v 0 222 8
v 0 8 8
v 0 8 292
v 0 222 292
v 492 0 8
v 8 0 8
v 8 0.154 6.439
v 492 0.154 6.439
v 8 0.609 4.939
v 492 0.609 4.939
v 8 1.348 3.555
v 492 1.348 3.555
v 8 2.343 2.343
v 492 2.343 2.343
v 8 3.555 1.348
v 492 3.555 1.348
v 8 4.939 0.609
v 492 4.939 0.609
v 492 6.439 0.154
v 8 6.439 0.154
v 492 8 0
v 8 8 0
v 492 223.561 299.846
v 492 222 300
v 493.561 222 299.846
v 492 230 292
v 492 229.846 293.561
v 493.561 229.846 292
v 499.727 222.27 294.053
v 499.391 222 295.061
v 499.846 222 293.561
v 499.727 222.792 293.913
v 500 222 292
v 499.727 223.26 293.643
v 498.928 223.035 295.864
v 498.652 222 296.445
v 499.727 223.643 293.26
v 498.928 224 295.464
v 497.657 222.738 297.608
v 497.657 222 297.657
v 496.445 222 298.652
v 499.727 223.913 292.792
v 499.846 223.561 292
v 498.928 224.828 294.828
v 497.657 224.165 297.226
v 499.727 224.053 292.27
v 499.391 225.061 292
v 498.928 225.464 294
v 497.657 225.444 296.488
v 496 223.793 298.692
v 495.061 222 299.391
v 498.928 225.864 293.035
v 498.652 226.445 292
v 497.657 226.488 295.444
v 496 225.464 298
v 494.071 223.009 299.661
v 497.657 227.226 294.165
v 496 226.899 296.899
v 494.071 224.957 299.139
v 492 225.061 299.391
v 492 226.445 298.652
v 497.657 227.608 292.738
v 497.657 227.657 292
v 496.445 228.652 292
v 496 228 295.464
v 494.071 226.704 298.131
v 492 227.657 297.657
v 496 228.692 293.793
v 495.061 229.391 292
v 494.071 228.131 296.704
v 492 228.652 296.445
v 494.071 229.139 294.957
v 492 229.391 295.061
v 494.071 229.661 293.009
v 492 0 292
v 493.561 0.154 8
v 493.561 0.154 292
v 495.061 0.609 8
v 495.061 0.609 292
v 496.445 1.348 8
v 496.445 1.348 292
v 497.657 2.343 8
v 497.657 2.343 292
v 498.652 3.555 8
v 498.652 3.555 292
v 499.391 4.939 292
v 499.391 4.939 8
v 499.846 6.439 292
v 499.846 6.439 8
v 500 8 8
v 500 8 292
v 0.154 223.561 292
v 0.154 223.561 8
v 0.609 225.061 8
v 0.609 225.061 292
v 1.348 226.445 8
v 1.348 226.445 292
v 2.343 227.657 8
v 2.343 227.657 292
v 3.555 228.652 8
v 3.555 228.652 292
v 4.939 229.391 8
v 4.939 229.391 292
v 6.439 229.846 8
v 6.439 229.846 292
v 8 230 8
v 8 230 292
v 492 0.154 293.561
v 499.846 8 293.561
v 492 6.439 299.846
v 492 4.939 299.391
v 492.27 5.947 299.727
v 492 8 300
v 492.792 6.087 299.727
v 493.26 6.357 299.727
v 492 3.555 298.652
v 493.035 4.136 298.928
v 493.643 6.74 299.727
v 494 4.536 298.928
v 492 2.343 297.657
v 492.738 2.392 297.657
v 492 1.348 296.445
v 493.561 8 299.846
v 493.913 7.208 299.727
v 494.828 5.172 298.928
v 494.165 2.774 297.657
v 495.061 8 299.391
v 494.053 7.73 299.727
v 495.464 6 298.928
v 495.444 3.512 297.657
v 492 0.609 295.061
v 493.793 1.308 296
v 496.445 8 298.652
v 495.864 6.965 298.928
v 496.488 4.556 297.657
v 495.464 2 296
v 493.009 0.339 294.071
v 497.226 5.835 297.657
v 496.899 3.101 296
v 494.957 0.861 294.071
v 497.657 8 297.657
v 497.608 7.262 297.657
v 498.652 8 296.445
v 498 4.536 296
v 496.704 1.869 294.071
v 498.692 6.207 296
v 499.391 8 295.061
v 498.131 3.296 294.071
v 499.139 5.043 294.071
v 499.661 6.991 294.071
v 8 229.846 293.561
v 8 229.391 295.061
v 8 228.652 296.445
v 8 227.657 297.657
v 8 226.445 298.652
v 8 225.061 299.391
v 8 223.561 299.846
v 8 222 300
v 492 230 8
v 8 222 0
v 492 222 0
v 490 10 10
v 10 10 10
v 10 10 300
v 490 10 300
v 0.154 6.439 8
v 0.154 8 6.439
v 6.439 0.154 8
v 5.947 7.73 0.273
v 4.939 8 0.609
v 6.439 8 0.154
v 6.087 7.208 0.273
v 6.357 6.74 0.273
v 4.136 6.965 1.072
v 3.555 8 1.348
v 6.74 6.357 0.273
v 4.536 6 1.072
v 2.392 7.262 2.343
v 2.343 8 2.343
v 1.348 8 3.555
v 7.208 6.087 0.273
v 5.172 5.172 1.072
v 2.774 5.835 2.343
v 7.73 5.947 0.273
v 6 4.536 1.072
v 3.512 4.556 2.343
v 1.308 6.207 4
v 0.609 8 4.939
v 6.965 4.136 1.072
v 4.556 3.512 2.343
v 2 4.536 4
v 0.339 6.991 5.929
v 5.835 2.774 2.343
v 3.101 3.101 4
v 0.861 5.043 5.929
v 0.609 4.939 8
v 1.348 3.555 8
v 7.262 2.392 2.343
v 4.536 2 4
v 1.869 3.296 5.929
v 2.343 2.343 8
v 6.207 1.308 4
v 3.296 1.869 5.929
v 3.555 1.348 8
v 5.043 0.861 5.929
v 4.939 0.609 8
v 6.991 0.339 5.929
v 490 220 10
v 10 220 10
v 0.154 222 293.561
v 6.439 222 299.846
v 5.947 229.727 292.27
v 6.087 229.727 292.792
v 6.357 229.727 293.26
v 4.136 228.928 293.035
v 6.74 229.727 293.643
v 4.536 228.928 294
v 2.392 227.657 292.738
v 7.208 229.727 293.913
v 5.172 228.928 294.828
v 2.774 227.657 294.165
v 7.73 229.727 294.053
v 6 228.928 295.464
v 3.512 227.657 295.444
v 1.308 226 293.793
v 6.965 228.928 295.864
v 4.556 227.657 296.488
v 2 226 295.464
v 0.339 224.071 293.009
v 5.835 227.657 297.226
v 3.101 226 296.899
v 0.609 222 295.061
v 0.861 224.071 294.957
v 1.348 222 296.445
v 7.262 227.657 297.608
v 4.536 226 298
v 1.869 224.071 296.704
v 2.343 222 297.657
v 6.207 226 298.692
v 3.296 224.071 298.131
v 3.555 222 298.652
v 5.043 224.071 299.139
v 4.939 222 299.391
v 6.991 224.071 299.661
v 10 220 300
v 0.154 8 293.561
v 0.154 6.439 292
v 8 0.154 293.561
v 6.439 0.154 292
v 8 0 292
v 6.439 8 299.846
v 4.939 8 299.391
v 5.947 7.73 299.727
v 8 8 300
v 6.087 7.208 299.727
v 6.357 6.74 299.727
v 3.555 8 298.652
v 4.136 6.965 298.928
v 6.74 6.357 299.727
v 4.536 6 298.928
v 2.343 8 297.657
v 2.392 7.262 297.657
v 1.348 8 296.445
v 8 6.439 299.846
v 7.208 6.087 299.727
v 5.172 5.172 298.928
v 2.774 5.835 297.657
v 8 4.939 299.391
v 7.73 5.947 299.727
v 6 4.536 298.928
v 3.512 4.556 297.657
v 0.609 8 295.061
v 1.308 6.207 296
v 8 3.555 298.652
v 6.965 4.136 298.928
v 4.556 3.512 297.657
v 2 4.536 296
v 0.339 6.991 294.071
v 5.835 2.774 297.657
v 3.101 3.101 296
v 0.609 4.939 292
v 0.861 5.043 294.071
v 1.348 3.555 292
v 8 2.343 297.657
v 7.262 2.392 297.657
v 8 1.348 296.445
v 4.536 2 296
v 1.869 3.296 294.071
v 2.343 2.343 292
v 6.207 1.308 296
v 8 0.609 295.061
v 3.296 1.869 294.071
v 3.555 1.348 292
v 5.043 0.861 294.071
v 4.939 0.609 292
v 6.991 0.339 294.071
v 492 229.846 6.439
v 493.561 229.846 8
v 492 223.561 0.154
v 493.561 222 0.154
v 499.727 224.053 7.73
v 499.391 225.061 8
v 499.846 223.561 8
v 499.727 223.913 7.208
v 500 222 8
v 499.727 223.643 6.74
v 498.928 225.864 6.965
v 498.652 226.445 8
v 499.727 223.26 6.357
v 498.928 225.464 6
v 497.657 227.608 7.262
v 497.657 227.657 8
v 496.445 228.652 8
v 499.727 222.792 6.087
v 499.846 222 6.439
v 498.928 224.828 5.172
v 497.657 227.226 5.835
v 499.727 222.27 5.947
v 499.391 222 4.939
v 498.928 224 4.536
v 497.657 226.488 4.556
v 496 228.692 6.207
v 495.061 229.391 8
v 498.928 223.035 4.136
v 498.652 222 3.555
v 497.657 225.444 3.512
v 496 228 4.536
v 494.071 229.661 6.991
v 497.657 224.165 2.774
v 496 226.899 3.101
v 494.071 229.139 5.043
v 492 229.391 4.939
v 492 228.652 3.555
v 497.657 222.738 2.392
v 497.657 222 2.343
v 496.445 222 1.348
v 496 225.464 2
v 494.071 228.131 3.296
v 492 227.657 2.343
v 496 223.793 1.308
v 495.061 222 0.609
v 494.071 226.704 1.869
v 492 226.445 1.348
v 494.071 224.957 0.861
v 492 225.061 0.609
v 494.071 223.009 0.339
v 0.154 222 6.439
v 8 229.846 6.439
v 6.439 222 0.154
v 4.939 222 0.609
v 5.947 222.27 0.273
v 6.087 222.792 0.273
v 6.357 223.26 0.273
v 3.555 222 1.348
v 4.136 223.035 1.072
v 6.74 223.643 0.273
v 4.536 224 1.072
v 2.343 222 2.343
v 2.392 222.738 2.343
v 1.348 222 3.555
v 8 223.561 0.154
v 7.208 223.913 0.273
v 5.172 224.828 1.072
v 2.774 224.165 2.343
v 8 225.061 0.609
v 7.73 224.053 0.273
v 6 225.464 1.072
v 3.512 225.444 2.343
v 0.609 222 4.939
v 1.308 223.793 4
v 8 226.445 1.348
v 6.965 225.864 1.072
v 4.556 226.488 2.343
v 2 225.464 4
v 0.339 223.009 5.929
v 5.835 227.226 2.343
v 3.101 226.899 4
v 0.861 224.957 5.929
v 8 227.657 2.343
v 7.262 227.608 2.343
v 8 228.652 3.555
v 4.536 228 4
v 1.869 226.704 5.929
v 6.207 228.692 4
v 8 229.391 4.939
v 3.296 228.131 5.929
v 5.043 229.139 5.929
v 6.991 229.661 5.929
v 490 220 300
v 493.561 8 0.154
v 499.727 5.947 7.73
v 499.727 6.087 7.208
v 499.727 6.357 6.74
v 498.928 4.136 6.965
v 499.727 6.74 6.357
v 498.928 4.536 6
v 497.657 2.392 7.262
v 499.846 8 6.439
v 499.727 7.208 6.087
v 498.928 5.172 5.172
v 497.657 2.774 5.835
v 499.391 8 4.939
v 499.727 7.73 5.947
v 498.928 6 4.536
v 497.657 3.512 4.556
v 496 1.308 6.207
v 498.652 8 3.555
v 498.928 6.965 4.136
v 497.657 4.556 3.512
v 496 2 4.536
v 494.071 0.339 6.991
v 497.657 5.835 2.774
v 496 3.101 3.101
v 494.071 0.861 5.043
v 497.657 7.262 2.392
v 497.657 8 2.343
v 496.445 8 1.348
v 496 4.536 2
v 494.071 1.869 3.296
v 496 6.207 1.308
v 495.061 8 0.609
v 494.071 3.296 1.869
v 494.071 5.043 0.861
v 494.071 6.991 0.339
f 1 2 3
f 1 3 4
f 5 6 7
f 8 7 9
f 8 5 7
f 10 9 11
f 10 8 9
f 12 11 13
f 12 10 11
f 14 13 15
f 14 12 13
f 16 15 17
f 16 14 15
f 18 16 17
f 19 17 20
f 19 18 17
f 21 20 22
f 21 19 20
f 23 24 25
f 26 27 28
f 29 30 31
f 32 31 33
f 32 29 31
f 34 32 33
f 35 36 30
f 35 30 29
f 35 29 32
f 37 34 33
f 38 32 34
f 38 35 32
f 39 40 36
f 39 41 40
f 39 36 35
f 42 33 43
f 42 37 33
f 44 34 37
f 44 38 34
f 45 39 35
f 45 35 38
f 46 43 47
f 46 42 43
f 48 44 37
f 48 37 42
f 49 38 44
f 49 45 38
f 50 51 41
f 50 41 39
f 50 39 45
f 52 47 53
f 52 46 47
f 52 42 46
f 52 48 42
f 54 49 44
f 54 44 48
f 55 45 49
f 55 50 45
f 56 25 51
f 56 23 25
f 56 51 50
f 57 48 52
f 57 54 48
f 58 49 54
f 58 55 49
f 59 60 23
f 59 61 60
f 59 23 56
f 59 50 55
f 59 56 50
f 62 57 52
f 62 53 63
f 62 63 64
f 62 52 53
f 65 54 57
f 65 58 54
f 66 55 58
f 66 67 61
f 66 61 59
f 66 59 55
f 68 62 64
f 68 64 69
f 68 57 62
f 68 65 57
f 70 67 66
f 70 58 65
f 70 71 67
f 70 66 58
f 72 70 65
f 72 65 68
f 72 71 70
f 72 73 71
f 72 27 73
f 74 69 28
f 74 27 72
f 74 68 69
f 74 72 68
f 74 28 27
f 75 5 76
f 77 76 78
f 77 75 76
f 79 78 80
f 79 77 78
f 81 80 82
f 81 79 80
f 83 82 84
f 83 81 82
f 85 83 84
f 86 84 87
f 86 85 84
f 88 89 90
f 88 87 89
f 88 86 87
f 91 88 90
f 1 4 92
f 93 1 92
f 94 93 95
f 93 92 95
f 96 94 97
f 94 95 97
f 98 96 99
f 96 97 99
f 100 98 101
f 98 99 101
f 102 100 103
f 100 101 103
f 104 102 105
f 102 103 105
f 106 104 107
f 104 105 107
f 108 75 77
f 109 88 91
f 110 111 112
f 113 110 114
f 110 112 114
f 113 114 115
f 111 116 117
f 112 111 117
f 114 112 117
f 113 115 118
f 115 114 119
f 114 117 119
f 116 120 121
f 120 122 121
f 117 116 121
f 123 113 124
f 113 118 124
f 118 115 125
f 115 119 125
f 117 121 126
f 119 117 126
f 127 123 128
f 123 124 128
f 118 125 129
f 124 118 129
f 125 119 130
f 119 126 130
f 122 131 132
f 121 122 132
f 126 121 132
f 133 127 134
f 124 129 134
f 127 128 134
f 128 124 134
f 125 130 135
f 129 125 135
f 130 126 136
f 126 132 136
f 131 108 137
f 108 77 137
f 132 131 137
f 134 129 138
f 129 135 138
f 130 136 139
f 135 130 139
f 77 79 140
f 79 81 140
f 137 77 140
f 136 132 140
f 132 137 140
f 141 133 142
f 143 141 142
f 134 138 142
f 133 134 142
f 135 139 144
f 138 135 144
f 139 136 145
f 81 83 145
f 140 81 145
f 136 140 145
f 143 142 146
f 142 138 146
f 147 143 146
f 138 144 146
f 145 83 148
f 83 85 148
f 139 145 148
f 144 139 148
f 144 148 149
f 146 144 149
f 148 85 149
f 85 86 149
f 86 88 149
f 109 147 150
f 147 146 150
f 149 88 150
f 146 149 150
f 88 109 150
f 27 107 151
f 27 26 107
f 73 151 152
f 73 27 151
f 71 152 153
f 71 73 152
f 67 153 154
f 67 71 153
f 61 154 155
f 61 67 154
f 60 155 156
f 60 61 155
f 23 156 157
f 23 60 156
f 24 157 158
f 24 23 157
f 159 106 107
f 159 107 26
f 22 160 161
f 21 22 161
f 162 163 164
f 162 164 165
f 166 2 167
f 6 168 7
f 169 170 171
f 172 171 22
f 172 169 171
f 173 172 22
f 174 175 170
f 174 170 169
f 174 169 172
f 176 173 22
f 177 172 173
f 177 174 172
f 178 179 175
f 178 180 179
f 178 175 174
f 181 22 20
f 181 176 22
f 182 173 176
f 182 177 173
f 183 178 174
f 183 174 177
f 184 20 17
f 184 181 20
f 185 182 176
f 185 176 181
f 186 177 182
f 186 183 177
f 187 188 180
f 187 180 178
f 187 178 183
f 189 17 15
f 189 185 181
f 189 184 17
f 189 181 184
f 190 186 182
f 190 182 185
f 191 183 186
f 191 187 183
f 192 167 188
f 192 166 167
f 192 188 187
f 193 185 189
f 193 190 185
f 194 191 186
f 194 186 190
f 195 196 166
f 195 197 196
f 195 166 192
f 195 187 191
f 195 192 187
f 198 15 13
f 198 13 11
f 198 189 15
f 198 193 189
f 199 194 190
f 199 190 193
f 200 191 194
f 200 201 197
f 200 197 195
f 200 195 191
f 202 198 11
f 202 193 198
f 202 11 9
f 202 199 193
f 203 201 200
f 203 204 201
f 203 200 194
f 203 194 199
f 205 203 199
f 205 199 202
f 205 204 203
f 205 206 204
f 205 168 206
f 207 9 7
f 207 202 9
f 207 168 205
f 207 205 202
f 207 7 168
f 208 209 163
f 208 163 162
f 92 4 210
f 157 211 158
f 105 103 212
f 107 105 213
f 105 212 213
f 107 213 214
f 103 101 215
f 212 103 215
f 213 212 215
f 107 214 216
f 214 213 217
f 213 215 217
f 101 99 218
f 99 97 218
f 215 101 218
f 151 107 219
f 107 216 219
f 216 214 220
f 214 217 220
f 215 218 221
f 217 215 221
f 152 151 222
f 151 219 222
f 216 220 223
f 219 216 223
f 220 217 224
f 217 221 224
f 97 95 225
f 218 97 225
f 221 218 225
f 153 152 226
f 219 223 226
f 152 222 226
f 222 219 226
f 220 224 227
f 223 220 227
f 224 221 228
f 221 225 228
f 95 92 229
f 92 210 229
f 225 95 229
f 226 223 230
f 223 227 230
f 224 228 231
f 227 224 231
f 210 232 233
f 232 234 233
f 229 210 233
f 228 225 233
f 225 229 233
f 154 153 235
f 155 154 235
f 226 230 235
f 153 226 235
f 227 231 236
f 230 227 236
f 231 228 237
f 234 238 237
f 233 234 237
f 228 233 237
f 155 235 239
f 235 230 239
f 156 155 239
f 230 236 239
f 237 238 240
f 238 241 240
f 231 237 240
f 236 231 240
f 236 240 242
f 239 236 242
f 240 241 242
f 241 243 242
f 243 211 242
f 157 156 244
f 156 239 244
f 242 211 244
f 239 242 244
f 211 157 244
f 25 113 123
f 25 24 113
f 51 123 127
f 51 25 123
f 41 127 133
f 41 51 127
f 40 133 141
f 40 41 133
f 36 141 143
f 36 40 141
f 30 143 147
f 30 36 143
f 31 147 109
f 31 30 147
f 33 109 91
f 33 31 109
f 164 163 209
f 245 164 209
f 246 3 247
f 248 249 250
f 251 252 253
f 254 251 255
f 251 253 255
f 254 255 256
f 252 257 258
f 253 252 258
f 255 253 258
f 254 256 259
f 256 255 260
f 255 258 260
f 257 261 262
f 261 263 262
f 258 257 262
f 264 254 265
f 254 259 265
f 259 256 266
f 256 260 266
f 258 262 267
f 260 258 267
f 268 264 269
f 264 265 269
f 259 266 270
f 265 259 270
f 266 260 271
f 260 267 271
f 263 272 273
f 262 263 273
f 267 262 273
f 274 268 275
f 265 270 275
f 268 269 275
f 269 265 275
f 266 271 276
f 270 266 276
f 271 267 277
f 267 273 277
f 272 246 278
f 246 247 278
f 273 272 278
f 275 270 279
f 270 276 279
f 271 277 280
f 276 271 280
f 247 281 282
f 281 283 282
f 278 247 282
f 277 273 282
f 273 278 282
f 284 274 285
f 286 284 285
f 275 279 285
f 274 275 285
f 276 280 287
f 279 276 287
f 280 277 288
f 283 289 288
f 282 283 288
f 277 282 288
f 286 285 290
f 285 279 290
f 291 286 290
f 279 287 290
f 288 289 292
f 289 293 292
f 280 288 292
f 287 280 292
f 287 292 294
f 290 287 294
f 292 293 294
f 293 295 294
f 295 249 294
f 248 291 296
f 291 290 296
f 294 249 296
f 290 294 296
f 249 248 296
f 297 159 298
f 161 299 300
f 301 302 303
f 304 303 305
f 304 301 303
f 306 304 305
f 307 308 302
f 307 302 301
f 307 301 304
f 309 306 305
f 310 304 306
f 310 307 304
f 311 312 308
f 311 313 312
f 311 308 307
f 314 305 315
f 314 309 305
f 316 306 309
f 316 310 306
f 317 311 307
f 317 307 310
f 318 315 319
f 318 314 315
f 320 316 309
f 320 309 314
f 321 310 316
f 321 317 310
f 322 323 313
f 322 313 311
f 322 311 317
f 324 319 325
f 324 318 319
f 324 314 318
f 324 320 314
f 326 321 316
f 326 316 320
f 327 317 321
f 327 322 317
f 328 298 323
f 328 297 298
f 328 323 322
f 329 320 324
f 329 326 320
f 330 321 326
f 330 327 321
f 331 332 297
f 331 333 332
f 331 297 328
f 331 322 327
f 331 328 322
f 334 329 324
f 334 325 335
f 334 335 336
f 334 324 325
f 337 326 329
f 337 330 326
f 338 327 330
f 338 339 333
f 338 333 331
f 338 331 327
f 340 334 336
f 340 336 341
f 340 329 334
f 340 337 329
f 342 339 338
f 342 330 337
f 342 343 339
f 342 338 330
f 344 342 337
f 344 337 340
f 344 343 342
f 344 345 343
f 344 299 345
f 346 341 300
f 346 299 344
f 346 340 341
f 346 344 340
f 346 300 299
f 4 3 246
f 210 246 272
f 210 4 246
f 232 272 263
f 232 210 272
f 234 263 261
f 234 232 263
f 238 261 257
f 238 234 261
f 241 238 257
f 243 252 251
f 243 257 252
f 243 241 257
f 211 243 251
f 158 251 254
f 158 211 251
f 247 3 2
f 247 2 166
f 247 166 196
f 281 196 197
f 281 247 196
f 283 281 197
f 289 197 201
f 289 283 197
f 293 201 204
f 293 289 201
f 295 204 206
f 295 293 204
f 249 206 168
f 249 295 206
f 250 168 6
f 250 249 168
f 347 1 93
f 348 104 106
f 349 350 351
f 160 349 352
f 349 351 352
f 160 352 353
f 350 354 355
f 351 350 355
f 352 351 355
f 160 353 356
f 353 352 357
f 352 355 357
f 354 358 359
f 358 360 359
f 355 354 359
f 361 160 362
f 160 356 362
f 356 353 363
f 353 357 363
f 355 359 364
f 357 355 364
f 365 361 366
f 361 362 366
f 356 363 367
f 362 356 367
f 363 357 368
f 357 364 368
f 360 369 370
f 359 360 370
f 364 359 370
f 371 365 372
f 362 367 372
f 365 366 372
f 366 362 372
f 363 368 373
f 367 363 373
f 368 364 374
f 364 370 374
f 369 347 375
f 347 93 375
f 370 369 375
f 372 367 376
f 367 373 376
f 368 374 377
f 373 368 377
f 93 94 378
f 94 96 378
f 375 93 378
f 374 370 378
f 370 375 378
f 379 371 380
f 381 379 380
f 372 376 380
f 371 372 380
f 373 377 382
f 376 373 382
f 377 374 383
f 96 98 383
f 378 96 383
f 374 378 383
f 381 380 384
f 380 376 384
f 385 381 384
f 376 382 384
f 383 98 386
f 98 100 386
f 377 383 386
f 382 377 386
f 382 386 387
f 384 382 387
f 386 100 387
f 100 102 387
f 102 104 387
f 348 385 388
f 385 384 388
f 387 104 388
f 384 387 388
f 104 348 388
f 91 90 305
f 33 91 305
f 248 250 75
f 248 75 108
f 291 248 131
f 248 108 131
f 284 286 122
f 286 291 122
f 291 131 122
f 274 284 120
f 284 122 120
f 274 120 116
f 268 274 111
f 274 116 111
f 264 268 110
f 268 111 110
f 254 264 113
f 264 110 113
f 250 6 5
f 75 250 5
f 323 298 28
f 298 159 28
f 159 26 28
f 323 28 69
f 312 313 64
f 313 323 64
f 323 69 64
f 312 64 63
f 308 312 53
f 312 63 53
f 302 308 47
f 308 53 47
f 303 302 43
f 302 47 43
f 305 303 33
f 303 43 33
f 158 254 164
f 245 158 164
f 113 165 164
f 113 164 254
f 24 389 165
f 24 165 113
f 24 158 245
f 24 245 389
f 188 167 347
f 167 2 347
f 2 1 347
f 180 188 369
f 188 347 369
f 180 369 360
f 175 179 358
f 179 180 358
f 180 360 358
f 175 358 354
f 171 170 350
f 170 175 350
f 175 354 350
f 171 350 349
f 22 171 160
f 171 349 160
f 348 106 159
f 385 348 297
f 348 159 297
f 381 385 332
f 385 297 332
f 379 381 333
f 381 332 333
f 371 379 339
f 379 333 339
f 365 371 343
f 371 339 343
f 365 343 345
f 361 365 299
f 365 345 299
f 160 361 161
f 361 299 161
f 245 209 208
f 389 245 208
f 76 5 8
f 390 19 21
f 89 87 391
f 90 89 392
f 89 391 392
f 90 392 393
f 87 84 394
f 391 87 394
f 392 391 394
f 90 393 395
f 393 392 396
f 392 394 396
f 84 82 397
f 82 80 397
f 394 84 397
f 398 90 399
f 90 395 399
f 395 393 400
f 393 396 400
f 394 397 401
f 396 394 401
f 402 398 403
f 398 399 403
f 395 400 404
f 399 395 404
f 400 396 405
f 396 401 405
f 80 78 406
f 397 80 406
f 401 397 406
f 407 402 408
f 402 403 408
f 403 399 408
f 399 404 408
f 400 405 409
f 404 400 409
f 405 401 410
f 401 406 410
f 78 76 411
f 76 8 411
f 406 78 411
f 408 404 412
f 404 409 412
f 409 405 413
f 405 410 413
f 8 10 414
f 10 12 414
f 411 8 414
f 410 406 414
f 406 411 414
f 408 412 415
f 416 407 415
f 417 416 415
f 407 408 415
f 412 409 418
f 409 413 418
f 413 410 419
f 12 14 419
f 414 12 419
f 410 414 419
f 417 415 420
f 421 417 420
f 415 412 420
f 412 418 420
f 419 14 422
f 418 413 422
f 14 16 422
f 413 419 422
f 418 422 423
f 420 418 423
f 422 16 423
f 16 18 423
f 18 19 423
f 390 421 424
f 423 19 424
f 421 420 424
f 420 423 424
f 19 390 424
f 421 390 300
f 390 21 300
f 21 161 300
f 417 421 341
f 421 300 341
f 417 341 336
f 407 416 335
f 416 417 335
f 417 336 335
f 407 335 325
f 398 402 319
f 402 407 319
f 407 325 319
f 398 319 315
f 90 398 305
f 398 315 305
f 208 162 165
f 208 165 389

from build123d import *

# Parameters (mm, degrees)
BOX001_W     = 480
BOX001_H     = 210
BOX001_DEPTH = 320
BOX_W        = 500
BOX_H        = 230
BOX_DEPTH    = 300
FILLET004_R  = 8


with BuildPart() as cube001:
    # Box001 → Box001 (new body)
    with BuildSketch(Plane(origin=(10, 10, 10), x_dir=(1, 0, 0), z_dir=(0, 0, 1))):
        with Locations((240, 105)):
            Rectangle(BOX001_W, BOX001_H)
    extrude(amount=BOX001_DEPTH)


with BuildPart() as solar_box:
    # Box → Box (new body)
    with BuildSketch(Plane.XY):
        with Locations((250, 115)):
            Rectangle(BOX_W, BOX_H)
    extrude(amount=BOX_DEPTH)

    # Cut: cut Cube001
    add(cube001.part, mode=Mode.SUBTRACT)

    # Fillet004
    fillet004_edges = [solar_box.edges().sort_by_distance(p)[0] for p in [
        (0, 0, 150),
        (0, 115, 300),
        (0, 230, 150),
        (0, 115, 0),
        (250, 0, 0),
        (500, 0, 150),
        (250, 0, 300),
        (250, 230, 300),
        (500, 115, 300),
        (250, 230, 0),
        (500, 230, 150),
        (500, 115, 0),
    ]]
    fillet(fillet004_edges, radius=FILLET004_R)


solid = solar_box.part
